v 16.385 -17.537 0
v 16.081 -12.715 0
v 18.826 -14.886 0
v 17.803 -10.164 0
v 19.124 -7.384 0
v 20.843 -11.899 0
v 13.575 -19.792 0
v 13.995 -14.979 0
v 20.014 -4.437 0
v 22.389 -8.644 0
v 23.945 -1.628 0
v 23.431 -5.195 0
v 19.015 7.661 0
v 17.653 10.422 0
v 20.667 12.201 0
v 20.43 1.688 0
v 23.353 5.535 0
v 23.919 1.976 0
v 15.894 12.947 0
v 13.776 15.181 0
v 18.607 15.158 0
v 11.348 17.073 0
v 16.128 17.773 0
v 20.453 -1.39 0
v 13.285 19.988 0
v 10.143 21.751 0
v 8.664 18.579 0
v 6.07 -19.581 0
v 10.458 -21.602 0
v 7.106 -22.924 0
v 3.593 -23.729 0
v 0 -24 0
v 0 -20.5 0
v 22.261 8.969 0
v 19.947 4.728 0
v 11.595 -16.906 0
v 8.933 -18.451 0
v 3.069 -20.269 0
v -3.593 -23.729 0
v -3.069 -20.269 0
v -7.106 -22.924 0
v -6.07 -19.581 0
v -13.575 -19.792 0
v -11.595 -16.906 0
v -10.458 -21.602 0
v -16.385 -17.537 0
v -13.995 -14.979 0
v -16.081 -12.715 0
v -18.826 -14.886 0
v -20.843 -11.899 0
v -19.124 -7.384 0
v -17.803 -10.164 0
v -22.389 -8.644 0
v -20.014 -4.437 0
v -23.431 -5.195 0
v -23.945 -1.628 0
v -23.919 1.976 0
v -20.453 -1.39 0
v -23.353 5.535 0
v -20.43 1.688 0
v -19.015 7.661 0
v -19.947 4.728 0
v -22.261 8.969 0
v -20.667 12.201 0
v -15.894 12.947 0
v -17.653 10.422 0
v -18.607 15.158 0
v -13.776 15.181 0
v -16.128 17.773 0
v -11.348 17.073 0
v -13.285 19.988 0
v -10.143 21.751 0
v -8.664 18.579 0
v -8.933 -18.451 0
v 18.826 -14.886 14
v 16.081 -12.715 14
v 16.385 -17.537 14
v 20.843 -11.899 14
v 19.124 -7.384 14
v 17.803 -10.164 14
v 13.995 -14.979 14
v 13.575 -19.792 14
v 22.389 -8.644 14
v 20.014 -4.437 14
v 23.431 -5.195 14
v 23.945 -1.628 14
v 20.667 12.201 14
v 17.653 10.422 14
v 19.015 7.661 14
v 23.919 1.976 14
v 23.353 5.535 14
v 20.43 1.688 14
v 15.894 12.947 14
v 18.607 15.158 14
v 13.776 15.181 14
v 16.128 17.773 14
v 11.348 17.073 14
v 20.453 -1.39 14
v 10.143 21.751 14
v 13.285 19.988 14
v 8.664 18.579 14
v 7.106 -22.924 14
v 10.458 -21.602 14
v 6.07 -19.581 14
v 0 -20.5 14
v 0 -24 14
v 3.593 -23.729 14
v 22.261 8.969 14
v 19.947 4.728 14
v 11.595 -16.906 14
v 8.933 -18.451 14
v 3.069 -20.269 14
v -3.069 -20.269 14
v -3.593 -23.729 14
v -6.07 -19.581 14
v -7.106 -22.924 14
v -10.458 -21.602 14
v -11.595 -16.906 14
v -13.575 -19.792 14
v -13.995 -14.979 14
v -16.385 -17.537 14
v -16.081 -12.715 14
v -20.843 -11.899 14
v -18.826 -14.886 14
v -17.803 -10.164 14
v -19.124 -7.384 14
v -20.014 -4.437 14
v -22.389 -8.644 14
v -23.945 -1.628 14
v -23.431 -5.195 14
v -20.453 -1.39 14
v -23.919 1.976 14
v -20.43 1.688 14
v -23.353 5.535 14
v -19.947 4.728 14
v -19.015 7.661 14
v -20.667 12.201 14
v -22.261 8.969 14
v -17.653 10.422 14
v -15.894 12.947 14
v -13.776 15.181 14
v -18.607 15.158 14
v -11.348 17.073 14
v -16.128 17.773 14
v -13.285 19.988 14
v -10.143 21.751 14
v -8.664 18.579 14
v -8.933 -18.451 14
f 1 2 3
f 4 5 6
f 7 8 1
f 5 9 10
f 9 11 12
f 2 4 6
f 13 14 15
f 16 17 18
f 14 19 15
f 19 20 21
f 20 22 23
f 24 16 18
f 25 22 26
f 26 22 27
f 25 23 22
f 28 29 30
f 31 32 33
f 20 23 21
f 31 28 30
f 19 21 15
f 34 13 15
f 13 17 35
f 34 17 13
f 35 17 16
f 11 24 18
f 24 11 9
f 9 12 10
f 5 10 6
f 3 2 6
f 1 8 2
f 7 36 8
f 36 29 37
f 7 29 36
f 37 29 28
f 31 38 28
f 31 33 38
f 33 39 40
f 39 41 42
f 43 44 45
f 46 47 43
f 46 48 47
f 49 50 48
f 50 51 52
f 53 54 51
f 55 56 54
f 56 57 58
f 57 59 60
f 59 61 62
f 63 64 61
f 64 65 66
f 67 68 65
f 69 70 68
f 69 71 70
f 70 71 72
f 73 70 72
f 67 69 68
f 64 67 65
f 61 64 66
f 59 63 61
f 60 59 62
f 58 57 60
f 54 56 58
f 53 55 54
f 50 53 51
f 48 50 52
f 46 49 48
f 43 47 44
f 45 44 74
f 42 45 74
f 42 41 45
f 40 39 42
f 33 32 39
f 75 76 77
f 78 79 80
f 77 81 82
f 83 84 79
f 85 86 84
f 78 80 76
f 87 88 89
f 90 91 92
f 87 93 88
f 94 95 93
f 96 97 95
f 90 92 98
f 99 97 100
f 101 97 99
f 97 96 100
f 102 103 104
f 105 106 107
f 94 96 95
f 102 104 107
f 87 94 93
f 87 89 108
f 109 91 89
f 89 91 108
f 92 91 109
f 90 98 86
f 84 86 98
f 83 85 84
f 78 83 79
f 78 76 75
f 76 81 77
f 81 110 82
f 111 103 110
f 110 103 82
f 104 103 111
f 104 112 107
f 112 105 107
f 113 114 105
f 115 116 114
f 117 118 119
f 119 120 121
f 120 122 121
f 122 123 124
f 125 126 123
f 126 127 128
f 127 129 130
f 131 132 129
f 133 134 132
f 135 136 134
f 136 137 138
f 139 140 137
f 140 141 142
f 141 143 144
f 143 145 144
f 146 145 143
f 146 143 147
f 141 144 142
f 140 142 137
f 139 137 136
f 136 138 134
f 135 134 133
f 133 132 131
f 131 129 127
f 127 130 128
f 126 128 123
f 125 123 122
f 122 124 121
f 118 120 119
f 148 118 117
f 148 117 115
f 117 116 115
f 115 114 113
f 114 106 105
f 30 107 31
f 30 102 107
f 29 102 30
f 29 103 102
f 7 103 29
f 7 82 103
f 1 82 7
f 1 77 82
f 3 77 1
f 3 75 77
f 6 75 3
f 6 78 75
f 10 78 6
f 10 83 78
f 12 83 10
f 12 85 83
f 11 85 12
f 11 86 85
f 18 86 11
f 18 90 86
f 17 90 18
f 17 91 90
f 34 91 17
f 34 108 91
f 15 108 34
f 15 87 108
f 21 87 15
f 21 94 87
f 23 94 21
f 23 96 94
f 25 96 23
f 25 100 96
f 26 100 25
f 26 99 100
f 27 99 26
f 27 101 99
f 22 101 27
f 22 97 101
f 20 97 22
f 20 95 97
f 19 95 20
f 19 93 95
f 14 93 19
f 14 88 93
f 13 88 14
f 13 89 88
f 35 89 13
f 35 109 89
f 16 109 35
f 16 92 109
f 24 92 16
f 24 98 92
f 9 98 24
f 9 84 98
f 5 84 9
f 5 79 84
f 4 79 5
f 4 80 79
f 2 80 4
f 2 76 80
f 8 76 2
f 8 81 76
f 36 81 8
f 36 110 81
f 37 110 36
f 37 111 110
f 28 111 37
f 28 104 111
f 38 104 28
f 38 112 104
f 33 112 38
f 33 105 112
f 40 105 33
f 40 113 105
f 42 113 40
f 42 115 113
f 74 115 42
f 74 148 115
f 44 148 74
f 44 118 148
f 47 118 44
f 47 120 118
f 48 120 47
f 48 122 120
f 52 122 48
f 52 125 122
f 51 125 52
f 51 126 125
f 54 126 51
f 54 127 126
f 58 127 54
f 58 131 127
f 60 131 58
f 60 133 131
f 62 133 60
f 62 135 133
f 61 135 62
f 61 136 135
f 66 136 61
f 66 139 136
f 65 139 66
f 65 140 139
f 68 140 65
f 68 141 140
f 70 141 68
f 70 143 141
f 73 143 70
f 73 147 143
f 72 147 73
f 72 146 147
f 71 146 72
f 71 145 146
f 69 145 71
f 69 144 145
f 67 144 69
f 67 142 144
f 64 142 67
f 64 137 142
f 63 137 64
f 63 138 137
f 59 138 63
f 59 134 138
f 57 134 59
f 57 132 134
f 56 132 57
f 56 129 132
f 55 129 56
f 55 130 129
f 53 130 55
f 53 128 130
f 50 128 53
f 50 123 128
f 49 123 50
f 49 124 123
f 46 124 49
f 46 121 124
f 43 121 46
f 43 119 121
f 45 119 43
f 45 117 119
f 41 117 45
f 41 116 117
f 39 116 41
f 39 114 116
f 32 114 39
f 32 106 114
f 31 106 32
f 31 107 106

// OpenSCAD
$fn = 32;

// ----------------------------------------------------------------------
// Spring clip: 48 mm outside, 3.5 mm band, 50 degree opening
// ----------------------------------------------------------------------

// --- parameters (mm) ---
outer_r = 24;             // clip outside radius
inner_r = 20.5;           // clip bore radius
band = 3.5;               // band thickness
clip_w = 14;              // clip width
opening = 50;             // opening angle

clip_profile = [[-10.143, 21.751], [-13.285, 19.988], [-16.128, 17.773], [-18.607, 15.158], [-20.667, 12.201], [-22.261, 8.969], [-23.353, 5.535], [-23.919, 1.976], [-23.945, -1.628], [-23.431, -5.195], [-22.389, -8.644], [-20.843, -11.899], [-18.826, -14.886], [-16.385, -17.537], [-13.575, -19.792], [-10.458, -21.602], [-7.106, -22.924], [-3.593, -23.729], [0, -24], [3.593, -23.729], [7.106, -22.924], [10.458, -21.602], [13.575, -19.792], [16.385, -17.537], [18.826, -14.886], [20.843, -11.899], [22.389, -8.644], [23.431, -5.195], [23.945, -1.628], [23.919, 1.976], [23.353, 5.535], [22.261, 8.969], [20.667, 12.201], [18.607, 15.158], [16.128, 17.773], [13.285, 19.988], [10.143, 21.751], [8.664, 18.579], [11.348, 17.073], [13.776, 15.181], [15.894, 12.947], [17.653, 10.422], [19.015, 7.661], [19.947, 4.728], [20.43, 1.688], [20.453, -1.39], [20.014, -4.437], [19.124, -7.384], [17.803, -10.164], [16.081, -12.715], [13.995, -14.979], [11.595, -16.906], [8.933, -18.451], [6.07, -19.581], [3.069, -20.269], [0, -20.5], [-3.069, -20.269], [-6.07, -19.581], [-8.933, -18.451], [-11.595, -16.906], [-13.995, -14.979], [-16.081, -12.715], [-17.803, -10.164], [-19.124, -7.384], [-20.014, -4.437], [-20.453, -1.39], [-20.43, 1.688], [-19.947, 4.728], [-19.015, 7.661], [-17.653, 10.422], [-15.894, 12.947], [-13.776, 15.181], [-11.348, 17.073], [-8.664, 18.579]];

difference() {
  union() {
    linear_extrude(height = clip_w) polygon(clip_profile);
  }
}
